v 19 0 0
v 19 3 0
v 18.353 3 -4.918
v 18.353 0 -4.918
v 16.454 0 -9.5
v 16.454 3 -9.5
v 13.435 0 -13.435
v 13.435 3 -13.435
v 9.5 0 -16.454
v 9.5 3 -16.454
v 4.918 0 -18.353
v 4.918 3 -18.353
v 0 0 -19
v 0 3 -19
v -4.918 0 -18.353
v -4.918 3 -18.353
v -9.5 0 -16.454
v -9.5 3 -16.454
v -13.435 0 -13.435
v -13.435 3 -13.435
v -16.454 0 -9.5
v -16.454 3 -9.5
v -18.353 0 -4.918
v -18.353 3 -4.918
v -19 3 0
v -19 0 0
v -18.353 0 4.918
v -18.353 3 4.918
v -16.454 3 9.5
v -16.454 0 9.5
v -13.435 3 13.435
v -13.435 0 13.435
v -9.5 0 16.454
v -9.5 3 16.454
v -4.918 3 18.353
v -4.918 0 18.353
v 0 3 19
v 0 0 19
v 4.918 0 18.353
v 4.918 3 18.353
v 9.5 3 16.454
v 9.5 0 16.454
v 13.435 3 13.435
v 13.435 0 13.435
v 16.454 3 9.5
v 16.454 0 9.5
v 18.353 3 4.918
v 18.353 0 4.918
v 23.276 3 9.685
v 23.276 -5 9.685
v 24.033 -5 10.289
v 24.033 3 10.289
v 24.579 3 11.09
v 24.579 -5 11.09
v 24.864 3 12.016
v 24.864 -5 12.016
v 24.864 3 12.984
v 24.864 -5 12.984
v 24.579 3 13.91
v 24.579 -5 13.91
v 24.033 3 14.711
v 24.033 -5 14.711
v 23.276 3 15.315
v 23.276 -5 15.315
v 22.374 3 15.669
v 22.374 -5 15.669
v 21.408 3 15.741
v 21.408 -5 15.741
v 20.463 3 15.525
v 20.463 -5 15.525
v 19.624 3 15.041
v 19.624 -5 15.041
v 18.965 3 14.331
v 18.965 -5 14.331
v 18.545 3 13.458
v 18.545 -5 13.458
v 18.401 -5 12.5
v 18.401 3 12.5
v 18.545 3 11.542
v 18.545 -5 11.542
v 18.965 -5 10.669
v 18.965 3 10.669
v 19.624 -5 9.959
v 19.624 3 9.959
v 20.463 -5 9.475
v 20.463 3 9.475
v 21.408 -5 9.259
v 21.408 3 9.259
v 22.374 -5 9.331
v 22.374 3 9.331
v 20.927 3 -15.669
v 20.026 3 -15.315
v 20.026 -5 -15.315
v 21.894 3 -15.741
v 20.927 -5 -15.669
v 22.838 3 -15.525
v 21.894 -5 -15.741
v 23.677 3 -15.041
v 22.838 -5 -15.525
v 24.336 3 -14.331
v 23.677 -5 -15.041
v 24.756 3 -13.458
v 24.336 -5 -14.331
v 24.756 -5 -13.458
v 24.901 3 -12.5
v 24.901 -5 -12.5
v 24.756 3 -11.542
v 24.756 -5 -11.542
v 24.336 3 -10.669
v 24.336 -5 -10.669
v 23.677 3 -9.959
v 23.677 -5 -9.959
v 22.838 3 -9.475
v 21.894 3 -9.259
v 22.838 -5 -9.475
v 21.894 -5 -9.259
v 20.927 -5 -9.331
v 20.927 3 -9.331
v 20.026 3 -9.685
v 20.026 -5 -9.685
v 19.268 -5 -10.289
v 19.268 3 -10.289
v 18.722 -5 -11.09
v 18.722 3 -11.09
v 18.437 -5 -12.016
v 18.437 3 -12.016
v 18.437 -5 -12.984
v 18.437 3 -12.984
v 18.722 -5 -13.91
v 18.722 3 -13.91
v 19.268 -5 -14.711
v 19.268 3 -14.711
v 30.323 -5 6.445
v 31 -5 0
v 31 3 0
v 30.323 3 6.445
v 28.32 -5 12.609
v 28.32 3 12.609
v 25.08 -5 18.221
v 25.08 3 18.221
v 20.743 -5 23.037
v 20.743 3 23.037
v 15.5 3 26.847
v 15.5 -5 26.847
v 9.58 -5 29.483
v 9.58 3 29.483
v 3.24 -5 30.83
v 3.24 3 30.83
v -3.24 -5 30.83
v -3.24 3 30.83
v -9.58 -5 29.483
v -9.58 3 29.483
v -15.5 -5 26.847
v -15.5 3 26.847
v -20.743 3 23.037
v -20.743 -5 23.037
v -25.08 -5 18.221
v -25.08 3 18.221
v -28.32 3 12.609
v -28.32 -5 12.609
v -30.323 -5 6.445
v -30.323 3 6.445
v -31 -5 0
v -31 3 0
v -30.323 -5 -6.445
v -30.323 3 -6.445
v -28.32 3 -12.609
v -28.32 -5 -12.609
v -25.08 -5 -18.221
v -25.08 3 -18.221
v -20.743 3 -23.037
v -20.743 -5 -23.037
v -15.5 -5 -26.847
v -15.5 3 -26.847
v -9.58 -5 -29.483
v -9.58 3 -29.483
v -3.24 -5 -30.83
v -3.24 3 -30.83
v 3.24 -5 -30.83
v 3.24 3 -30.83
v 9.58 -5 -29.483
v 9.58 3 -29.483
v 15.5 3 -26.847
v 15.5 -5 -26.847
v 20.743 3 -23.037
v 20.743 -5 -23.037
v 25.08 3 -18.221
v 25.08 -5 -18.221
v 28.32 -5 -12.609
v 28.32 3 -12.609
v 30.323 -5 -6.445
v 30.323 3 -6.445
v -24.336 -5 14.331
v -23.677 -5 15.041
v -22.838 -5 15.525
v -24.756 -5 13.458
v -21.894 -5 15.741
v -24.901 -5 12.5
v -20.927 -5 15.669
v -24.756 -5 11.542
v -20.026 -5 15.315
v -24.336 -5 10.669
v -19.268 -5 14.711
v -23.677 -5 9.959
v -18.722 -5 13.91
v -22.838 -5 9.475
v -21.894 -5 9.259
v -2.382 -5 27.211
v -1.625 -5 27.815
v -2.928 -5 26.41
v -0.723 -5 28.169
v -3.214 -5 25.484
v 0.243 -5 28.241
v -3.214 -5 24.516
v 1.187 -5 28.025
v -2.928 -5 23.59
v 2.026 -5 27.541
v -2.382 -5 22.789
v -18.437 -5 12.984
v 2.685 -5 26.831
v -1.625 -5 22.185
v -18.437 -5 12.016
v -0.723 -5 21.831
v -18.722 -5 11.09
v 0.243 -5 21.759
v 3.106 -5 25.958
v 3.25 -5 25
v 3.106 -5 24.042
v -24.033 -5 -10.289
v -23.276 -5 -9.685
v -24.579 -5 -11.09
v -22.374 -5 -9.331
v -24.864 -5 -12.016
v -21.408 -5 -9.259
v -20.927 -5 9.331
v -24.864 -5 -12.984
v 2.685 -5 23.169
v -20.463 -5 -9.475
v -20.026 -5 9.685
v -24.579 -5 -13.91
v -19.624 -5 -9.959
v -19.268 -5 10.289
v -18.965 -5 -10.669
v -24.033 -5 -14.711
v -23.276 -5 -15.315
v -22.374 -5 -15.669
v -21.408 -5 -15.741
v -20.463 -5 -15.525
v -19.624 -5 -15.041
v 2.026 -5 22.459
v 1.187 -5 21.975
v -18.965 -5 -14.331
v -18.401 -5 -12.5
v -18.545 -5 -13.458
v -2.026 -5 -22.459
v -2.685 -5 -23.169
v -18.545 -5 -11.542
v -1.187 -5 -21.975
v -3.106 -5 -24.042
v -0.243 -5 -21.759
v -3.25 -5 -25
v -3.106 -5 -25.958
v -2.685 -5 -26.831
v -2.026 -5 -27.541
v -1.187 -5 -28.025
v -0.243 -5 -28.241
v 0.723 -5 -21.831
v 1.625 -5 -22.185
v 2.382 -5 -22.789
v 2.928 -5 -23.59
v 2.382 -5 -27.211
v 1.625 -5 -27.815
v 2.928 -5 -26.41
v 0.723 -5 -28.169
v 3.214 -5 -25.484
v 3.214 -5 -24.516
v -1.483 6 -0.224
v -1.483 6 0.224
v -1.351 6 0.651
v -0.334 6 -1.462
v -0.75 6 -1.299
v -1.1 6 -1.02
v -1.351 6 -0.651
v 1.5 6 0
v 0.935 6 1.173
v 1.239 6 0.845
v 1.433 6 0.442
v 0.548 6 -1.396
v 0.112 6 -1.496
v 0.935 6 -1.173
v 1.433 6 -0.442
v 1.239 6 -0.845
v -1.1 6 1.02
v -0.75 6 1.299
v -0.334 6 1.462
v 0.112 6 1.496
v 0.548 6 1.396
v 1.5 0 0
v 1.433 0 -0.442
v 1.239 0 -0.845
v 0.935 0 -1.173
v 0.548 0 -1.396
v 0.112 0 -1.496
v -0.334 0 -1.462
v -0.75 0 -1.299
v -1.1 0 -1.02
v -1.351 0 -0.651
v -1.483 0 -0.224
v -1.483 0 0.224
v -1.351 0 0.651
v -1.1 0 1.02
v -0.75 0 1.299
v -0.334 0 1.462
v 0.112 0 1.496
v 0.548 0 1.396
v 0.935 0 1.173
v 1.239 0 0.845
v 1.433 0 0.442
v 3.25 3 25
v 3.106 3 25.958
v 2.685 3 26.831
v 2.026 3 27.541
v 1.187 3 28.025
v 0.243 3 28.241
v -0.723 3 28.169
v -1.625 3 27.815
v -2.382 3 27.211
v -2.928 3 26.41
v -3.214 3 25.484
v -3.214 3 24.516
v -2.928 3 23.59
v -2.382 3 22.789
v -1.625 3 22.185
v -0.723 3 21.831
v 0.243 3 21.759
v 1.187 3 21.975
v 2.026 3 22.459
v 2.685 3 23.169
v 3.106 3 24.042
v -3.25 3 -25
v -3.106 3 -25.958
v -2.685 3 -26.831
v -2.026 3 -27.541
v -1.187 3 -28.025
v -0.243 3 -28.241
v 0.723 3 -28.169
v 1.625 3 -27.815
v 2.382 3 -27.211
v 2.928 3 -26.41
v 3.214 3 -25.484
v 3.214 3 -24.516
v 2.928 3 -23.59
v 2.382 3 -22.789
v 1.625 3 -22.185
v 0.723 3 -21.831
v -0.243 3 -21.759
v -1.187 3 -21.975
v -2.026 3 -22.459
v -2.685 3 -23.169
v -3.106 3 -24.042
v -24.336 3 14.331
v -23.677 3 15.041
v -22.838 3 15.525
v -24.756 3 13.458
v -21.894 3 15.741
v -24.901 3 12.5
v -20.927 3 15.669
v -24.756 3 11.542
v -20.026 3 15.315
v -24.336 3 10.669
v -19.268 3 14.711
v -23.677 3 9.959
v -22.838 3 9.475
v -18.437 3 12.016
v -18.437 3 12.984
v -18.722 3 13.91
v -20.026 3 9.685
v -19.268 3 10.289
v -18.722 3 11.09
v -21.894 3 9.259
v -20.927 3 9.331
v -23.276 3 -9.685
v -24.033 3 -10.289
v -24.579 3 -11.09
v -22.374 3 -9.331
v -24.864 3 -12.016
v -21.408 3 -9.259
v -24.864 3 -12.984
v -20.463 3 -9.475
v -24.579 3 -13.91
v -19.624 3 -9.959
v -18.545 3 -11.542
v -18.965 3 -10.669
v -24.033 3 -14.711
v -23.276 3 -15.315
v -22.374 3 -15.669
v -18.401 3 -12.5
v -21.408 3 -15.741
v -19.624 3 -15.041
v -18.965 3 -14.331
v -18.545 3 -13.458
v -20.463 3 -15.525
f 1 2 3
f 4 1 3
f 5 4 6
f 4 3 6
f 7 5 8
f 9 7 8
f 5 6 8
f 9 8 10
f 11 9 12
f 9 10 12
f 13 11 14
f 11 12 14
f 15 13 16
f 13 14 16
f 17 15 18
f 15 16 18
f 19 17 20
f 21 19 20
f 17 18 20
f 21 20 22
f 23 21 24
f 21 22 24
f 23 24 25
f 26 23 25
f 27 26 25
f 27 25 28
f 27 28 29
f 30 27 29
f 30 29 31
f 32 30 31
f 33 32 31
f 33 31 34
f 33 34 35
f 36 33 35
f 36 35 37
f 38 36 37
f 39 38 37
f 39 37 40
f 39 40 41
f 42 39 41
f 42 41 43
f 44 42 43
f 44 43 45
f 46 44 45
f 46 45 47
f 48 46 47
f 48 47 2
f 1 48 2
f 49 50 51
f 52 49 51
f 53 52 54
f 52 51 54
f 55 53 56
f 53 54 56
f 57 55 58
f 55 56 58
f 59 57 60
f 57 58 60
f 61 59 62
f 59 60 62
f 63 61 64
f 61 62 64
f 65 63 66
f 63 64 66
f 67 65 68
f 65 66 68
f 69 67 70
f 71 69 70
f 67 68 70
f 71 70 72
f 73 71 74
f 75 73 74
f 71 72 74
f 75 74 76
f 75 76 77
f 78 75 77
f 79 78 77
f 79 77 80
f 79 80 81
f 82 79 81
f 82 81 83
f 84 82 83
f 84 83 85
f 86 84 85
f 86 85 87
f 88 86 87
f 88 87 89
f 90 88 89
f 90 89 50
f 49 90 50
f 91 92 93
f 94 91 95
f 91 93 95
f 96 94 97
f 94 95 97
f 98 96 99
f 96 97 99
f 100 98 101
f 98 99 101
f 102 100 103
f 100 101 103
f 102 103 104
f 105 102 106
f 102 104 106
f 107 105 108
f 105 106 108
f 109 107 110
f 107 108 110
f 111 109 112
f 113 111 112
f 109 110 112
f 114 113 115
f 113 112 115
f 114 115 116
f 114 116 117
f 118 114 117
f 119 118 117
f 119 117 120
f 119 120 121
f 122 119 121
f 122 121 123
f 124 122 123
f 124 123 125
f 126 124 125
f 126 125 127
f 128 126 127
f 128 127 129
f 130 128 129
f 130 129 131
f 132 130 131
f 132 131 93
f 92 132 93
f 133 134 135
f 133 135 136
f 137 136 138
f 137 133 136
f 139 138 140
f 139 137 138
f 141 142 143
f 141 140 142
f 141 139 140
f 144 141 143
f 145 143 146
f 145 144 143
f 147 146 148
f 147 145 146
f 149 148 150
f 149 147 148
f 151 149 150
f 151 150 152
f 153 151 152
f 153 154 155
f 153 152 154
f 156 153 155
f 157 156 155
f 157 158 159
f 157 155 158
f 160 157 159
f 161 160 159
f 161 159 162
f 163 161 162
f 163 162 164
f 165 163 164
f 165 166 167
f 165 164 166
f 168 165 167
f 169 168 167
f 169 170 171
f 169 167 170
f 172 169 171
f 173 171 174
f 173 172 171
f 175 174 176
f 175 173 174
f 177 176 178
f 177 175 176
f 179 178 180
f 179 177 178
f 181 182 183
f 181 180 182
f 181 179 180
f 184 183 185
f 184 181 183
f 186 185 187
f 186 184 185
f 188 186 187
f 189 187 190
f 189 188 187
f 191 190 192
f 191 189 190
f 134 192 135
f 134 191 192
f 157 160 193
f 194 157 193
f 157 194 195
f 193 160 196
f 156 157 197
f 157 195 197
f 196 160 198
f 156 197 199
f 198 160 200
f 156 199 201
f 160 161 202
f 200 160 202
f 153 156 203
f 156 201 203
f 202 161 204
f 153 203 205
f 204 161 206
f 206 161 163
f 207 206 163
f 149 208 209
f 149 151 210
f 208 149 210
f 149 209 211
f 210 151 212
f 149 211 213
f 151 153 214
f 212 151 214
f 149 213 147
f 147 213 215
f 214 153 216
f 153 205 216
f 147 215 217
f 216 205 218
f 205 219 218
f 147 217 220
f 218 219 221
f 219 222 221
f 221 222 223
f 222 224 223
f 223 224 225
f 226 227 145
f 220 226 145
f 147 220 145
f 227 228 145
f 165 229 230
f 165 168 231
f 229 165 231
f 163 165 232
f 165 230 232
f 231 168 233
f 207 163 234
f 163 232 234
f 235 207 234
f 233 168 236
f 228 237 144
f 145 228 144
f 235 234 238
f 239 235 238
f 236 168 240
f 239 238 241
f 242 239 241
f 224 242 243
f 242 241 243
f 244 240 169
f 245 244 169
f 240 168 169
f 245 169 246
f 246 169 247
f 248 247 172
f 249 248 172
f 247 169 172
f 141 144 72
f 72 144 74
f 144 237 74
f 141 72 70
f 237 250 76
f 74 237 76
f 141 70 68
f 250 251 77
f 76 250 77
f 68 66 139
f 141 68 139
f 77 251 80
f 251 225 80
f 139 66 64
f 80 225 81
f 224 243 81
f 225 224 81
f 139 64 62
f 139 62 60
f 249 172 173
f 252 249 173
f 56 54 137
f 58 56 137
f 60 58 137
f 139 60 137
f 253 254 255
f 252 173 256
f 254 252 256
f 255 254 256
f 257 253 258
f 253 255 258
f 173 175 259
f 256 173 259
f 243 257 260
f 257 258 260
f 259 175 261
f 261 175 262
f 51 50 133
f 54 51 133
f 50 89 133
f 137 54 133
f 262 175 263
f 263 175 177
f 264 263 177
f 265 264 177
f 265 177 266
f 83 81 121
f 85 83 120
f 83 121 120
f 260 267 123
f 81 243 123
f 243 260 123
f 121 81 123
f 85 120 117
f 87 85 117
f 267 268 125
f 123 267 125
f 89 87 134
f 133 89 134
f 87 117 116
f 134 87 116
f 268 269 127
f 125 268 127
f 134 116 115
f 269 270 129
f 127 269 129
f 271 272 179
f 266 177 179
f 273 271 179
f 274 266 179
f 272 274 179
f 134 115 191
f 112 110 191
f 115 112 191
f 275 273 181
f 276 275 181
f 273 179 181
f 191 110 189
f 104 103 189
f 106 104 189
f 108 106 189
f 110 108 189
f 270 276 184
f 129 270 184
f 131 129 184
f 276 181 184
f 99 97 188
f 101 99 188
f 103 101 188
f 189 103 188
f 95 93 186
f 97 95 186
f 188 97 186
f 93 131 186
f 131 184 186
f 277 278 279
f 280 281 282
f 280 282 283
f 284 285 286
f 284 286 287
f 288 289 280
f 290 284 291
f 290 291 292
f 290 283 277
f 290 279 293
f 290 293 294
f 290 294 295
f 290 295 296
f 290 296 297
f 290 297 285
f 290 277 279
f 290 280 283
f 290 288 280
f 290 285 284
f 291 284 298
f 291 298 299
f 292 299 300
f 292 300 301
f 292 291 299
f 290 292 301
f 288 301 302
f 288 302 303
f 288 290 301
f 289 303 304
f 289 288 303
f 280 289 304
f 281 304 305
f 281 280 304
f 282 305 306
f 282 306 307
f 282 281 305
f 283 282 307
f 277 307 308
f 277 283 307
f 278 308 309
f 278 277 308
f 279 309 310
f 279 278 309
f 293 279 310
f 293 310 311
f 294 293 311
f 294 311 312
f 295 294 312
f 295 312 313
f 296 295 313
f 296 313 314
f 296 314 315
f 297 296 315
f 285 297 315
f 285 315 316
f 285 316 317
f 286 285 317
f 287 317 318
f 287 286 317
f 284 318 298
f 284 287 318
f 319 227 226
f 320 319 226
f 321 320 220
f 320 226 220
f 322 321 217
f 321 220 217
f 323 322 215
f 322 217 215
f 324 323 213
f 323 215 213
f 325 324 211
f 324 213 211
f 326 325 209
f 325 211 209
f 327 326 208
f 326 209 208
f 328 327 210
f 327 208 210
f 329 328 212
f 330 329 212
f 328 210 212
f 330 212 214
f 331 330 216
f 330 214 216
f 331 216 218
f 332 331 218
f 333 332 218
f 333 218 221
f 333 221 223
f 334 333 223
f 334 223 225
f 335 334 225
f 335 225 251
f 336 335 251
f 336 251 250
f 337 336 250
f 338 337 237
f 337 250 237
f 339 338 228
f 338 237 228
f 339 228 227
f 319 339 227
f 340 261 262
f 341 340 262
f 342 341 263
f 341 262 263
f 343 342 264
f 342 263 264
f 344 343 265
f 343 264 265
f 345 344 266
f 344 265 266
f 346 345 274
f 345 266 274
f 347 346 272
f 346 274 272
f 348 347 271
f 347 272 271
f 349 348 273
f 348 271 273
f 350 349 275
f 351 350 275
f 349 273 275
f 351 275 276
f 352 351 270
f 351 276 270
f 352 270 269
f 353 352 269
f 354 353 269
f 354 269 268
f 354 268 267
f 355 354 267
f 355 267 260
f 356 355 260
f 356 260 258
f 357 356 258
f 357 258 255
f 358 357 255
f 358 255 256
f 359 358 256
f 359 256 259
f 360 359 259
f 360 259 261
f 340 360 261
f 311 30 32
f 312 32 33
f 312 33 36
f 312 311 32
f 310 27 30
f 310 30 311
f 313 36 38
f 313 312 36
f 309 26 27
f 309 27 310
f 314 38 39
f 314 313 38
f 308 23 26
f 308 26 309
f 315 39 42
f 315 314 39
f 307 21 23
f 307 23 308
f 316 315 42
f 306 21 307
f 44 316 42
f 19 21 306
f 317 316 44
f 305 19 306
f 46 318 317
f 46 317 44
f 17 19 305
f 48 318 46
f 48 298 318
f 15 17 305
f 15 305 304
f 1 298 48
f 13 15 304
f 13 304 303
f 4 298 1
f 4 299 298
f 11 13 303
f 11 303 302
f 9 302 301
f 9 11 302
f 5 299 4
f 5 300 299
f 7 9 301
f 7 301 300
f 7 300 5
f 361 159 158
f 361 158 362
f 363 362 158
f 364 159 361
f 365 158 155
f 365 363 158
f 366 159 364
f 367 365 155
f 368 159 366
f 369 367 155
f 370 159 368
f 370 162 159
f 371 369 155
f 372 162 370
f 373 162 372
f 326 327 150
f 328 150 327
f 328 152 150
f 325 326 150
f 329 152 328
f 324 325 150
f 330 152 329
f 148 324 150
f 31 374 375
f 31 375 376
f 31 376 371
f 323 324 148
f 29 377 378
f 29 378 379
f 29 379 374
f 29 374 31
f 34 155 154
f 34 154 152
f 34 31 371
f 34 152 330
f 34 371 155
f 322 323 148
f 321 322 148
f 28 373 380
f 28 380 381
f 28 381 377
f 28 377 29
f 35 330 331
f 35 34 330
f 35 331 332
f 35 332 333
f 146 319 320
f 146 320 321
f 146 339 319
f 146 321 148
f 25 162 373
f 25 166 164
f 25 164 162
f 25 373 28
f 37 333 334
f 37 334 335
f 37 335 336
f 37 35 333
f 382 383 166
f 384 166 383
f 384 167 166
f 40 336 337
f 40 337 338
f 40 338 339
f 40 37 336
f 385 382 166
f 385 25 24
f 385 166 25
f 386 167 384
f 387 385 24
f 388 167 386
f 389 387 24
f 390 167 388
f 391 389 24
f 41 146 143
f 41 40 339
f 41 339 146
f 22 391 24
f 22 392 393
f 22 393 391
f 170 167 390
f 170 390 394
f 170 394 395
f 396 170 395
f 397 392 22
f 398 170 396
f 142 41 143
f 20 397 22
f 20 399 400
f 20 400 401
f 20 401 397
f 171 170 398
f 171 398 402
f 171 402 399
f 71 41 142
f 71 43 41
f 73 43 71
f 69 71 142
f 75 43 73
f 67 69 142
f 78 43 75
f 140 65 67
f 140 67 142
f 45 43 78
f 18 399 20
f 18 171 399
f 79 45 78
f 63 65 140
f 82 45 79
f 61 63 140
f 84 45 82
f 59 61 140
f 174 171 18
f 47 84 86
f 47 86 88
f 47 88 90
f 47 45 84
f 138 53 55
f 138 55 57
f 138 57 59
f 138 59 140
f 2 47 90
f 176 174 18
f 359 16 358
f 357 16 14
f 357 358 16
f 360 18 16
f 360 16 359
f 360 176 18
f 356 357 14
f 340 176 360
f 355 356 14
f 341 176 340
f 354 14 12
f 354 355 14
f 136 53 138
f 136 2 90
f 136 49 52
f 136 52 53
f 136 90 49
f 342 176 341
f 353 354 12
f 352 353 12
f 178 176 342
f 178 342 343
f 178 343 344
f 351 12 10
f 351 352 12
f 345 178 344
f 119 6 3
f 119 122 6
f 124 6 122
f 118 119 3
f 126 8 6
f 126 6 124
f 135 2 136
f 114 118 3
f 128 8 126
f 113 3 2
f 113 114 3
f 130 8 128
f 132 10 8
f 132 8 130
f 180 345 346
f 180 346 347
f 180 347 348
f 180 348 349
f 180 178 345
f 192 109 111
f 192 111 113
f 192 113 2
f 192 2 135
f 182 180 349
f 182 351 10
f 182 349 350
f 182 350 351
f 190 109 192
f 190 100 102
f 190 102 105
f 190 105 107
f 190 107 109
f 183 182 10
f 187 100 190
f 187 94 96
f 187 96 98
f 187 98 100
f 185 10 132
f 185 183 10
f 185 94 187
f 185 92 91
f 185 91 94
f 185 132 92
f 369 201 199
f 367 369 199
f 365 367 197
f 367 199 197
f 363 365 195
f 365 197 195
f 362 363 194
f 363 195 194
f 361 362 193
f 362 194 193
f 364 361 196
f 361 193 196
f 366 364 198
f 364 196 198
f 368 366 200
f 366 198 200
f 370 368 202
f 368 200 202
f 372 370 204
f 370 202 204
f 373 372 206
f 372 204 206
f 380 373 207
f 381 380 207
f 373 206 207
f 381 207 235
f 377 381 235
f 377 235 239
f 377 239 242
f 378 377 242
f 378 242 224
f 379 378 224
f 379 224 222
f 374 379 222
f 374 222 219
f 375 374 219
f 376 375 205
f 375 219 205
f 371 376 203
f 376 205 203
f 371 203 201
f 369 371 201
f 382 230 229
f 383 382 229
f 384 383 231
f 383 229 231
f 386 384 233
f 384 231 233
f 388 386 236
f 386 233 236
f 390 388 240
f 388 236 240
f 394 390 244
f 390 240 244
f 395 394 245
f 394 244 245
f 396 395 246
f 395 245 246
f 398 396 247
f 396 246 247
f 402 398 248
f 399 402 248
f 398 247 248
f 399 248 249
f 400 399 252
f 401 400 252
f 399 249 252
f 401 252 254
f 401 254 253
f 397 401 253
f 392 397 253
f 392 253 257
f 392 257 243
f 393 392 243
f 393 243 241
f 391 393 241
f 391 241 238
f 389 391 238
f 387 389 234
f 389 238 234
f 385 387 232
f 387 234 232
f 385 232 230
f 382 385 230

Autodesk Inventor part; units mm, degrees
ref_plane "YZ Plane" through (0, 0, 0) normal (1, 0, 0) x (0, 1, 0)
ref_plane "XZ Plane" through (0, 0, 0) normal (0, 1, 0) x (-1, 0, 0)
ref_plane "XY Plane" through (0, 0, 0) normal (0, 0, 1) x (1, 0, 0)
sketch "Sketch1" plane through (0, 0, 0) normal (0, 0, 1) x (1, 0, 0)
  line L0 (-6.2, 0) -> (37.2, 0) construction
  line L1 (0, -7.2) -> (0, 8.2) construction
  line L2 (1.5, 0) -> (19, 0)
  line L3 (1.5, 0) -> (1.5, 1.5)
  line L4 (19, 0) -> (19, 3)
  line L5 (17, 5) -> (14, 5)
  line L6 (10.5, 1.5) -> (1.5, 1.5)
  line L7 (10.5, 1.5) -> (14, 5)
  line L8 (10.5, 1.5) -> (15.4497, 1.5) construction
  arc A0 (19, 3) -> (17, 5) centre (17, 3) ccw
  line L9 (19, 3) -> (31, 3)
  line L10 (31, 3) -> (31, -5)
  line L11 (31, -5) -> (0, -5)
  line L12 (1.5, 6) -> (0, 6)
  line L13 (0, 6) -> (0, -5)
  line L14 (1.5, 1.5) -> (1.5, 6)
  point P0 (0, 0)
  point P1 (19, 5)
  dimension "d1" = 19
  dimension "d2" = 1.5
  dimension "d3" = 1.5
  dimension "d4" = 5
  dimension "d6" = 45
  dimension "d7" = 10.5
  dimension "d8" = 2
  dimension "d9" = 12
  dimension "d10" = 5
  dimension "d18" = 6
revolve "Revolution1" add sketch "Sketch1" angle 360 about axis through (0, -10, 0) along (0, 1, 0) contours L2 L4 L9 L10 L11 L13 L12 L14 L3
sketch "Sketch2" plane through (0, -5, 0) normal (0, -1, 0) x (1, 0, 0)
  circle A0 centre (0, 0) radius 31 construction
  circle A1 centre (0, 0) radius 19 construction
  circle A2 centre (0, 0) radius 19 construction
  line L0 (0, 19) -> (0, 31) construction
  circle A3 centre (0, 0) radius 31 construction
  circle A4 centre (0, 25) radius 3.25
  dimension "d12" = 6.5
extrude "Extrusion1" cut sketch "Sketch2" against normal up to surface (8 mm away)
pattern_circular "Circular Pattern1" count 6 over 360 about axis through (0, -1, 0) along (0, -1, 0) of "Extrusion1"
properties part number "MouldBase"
